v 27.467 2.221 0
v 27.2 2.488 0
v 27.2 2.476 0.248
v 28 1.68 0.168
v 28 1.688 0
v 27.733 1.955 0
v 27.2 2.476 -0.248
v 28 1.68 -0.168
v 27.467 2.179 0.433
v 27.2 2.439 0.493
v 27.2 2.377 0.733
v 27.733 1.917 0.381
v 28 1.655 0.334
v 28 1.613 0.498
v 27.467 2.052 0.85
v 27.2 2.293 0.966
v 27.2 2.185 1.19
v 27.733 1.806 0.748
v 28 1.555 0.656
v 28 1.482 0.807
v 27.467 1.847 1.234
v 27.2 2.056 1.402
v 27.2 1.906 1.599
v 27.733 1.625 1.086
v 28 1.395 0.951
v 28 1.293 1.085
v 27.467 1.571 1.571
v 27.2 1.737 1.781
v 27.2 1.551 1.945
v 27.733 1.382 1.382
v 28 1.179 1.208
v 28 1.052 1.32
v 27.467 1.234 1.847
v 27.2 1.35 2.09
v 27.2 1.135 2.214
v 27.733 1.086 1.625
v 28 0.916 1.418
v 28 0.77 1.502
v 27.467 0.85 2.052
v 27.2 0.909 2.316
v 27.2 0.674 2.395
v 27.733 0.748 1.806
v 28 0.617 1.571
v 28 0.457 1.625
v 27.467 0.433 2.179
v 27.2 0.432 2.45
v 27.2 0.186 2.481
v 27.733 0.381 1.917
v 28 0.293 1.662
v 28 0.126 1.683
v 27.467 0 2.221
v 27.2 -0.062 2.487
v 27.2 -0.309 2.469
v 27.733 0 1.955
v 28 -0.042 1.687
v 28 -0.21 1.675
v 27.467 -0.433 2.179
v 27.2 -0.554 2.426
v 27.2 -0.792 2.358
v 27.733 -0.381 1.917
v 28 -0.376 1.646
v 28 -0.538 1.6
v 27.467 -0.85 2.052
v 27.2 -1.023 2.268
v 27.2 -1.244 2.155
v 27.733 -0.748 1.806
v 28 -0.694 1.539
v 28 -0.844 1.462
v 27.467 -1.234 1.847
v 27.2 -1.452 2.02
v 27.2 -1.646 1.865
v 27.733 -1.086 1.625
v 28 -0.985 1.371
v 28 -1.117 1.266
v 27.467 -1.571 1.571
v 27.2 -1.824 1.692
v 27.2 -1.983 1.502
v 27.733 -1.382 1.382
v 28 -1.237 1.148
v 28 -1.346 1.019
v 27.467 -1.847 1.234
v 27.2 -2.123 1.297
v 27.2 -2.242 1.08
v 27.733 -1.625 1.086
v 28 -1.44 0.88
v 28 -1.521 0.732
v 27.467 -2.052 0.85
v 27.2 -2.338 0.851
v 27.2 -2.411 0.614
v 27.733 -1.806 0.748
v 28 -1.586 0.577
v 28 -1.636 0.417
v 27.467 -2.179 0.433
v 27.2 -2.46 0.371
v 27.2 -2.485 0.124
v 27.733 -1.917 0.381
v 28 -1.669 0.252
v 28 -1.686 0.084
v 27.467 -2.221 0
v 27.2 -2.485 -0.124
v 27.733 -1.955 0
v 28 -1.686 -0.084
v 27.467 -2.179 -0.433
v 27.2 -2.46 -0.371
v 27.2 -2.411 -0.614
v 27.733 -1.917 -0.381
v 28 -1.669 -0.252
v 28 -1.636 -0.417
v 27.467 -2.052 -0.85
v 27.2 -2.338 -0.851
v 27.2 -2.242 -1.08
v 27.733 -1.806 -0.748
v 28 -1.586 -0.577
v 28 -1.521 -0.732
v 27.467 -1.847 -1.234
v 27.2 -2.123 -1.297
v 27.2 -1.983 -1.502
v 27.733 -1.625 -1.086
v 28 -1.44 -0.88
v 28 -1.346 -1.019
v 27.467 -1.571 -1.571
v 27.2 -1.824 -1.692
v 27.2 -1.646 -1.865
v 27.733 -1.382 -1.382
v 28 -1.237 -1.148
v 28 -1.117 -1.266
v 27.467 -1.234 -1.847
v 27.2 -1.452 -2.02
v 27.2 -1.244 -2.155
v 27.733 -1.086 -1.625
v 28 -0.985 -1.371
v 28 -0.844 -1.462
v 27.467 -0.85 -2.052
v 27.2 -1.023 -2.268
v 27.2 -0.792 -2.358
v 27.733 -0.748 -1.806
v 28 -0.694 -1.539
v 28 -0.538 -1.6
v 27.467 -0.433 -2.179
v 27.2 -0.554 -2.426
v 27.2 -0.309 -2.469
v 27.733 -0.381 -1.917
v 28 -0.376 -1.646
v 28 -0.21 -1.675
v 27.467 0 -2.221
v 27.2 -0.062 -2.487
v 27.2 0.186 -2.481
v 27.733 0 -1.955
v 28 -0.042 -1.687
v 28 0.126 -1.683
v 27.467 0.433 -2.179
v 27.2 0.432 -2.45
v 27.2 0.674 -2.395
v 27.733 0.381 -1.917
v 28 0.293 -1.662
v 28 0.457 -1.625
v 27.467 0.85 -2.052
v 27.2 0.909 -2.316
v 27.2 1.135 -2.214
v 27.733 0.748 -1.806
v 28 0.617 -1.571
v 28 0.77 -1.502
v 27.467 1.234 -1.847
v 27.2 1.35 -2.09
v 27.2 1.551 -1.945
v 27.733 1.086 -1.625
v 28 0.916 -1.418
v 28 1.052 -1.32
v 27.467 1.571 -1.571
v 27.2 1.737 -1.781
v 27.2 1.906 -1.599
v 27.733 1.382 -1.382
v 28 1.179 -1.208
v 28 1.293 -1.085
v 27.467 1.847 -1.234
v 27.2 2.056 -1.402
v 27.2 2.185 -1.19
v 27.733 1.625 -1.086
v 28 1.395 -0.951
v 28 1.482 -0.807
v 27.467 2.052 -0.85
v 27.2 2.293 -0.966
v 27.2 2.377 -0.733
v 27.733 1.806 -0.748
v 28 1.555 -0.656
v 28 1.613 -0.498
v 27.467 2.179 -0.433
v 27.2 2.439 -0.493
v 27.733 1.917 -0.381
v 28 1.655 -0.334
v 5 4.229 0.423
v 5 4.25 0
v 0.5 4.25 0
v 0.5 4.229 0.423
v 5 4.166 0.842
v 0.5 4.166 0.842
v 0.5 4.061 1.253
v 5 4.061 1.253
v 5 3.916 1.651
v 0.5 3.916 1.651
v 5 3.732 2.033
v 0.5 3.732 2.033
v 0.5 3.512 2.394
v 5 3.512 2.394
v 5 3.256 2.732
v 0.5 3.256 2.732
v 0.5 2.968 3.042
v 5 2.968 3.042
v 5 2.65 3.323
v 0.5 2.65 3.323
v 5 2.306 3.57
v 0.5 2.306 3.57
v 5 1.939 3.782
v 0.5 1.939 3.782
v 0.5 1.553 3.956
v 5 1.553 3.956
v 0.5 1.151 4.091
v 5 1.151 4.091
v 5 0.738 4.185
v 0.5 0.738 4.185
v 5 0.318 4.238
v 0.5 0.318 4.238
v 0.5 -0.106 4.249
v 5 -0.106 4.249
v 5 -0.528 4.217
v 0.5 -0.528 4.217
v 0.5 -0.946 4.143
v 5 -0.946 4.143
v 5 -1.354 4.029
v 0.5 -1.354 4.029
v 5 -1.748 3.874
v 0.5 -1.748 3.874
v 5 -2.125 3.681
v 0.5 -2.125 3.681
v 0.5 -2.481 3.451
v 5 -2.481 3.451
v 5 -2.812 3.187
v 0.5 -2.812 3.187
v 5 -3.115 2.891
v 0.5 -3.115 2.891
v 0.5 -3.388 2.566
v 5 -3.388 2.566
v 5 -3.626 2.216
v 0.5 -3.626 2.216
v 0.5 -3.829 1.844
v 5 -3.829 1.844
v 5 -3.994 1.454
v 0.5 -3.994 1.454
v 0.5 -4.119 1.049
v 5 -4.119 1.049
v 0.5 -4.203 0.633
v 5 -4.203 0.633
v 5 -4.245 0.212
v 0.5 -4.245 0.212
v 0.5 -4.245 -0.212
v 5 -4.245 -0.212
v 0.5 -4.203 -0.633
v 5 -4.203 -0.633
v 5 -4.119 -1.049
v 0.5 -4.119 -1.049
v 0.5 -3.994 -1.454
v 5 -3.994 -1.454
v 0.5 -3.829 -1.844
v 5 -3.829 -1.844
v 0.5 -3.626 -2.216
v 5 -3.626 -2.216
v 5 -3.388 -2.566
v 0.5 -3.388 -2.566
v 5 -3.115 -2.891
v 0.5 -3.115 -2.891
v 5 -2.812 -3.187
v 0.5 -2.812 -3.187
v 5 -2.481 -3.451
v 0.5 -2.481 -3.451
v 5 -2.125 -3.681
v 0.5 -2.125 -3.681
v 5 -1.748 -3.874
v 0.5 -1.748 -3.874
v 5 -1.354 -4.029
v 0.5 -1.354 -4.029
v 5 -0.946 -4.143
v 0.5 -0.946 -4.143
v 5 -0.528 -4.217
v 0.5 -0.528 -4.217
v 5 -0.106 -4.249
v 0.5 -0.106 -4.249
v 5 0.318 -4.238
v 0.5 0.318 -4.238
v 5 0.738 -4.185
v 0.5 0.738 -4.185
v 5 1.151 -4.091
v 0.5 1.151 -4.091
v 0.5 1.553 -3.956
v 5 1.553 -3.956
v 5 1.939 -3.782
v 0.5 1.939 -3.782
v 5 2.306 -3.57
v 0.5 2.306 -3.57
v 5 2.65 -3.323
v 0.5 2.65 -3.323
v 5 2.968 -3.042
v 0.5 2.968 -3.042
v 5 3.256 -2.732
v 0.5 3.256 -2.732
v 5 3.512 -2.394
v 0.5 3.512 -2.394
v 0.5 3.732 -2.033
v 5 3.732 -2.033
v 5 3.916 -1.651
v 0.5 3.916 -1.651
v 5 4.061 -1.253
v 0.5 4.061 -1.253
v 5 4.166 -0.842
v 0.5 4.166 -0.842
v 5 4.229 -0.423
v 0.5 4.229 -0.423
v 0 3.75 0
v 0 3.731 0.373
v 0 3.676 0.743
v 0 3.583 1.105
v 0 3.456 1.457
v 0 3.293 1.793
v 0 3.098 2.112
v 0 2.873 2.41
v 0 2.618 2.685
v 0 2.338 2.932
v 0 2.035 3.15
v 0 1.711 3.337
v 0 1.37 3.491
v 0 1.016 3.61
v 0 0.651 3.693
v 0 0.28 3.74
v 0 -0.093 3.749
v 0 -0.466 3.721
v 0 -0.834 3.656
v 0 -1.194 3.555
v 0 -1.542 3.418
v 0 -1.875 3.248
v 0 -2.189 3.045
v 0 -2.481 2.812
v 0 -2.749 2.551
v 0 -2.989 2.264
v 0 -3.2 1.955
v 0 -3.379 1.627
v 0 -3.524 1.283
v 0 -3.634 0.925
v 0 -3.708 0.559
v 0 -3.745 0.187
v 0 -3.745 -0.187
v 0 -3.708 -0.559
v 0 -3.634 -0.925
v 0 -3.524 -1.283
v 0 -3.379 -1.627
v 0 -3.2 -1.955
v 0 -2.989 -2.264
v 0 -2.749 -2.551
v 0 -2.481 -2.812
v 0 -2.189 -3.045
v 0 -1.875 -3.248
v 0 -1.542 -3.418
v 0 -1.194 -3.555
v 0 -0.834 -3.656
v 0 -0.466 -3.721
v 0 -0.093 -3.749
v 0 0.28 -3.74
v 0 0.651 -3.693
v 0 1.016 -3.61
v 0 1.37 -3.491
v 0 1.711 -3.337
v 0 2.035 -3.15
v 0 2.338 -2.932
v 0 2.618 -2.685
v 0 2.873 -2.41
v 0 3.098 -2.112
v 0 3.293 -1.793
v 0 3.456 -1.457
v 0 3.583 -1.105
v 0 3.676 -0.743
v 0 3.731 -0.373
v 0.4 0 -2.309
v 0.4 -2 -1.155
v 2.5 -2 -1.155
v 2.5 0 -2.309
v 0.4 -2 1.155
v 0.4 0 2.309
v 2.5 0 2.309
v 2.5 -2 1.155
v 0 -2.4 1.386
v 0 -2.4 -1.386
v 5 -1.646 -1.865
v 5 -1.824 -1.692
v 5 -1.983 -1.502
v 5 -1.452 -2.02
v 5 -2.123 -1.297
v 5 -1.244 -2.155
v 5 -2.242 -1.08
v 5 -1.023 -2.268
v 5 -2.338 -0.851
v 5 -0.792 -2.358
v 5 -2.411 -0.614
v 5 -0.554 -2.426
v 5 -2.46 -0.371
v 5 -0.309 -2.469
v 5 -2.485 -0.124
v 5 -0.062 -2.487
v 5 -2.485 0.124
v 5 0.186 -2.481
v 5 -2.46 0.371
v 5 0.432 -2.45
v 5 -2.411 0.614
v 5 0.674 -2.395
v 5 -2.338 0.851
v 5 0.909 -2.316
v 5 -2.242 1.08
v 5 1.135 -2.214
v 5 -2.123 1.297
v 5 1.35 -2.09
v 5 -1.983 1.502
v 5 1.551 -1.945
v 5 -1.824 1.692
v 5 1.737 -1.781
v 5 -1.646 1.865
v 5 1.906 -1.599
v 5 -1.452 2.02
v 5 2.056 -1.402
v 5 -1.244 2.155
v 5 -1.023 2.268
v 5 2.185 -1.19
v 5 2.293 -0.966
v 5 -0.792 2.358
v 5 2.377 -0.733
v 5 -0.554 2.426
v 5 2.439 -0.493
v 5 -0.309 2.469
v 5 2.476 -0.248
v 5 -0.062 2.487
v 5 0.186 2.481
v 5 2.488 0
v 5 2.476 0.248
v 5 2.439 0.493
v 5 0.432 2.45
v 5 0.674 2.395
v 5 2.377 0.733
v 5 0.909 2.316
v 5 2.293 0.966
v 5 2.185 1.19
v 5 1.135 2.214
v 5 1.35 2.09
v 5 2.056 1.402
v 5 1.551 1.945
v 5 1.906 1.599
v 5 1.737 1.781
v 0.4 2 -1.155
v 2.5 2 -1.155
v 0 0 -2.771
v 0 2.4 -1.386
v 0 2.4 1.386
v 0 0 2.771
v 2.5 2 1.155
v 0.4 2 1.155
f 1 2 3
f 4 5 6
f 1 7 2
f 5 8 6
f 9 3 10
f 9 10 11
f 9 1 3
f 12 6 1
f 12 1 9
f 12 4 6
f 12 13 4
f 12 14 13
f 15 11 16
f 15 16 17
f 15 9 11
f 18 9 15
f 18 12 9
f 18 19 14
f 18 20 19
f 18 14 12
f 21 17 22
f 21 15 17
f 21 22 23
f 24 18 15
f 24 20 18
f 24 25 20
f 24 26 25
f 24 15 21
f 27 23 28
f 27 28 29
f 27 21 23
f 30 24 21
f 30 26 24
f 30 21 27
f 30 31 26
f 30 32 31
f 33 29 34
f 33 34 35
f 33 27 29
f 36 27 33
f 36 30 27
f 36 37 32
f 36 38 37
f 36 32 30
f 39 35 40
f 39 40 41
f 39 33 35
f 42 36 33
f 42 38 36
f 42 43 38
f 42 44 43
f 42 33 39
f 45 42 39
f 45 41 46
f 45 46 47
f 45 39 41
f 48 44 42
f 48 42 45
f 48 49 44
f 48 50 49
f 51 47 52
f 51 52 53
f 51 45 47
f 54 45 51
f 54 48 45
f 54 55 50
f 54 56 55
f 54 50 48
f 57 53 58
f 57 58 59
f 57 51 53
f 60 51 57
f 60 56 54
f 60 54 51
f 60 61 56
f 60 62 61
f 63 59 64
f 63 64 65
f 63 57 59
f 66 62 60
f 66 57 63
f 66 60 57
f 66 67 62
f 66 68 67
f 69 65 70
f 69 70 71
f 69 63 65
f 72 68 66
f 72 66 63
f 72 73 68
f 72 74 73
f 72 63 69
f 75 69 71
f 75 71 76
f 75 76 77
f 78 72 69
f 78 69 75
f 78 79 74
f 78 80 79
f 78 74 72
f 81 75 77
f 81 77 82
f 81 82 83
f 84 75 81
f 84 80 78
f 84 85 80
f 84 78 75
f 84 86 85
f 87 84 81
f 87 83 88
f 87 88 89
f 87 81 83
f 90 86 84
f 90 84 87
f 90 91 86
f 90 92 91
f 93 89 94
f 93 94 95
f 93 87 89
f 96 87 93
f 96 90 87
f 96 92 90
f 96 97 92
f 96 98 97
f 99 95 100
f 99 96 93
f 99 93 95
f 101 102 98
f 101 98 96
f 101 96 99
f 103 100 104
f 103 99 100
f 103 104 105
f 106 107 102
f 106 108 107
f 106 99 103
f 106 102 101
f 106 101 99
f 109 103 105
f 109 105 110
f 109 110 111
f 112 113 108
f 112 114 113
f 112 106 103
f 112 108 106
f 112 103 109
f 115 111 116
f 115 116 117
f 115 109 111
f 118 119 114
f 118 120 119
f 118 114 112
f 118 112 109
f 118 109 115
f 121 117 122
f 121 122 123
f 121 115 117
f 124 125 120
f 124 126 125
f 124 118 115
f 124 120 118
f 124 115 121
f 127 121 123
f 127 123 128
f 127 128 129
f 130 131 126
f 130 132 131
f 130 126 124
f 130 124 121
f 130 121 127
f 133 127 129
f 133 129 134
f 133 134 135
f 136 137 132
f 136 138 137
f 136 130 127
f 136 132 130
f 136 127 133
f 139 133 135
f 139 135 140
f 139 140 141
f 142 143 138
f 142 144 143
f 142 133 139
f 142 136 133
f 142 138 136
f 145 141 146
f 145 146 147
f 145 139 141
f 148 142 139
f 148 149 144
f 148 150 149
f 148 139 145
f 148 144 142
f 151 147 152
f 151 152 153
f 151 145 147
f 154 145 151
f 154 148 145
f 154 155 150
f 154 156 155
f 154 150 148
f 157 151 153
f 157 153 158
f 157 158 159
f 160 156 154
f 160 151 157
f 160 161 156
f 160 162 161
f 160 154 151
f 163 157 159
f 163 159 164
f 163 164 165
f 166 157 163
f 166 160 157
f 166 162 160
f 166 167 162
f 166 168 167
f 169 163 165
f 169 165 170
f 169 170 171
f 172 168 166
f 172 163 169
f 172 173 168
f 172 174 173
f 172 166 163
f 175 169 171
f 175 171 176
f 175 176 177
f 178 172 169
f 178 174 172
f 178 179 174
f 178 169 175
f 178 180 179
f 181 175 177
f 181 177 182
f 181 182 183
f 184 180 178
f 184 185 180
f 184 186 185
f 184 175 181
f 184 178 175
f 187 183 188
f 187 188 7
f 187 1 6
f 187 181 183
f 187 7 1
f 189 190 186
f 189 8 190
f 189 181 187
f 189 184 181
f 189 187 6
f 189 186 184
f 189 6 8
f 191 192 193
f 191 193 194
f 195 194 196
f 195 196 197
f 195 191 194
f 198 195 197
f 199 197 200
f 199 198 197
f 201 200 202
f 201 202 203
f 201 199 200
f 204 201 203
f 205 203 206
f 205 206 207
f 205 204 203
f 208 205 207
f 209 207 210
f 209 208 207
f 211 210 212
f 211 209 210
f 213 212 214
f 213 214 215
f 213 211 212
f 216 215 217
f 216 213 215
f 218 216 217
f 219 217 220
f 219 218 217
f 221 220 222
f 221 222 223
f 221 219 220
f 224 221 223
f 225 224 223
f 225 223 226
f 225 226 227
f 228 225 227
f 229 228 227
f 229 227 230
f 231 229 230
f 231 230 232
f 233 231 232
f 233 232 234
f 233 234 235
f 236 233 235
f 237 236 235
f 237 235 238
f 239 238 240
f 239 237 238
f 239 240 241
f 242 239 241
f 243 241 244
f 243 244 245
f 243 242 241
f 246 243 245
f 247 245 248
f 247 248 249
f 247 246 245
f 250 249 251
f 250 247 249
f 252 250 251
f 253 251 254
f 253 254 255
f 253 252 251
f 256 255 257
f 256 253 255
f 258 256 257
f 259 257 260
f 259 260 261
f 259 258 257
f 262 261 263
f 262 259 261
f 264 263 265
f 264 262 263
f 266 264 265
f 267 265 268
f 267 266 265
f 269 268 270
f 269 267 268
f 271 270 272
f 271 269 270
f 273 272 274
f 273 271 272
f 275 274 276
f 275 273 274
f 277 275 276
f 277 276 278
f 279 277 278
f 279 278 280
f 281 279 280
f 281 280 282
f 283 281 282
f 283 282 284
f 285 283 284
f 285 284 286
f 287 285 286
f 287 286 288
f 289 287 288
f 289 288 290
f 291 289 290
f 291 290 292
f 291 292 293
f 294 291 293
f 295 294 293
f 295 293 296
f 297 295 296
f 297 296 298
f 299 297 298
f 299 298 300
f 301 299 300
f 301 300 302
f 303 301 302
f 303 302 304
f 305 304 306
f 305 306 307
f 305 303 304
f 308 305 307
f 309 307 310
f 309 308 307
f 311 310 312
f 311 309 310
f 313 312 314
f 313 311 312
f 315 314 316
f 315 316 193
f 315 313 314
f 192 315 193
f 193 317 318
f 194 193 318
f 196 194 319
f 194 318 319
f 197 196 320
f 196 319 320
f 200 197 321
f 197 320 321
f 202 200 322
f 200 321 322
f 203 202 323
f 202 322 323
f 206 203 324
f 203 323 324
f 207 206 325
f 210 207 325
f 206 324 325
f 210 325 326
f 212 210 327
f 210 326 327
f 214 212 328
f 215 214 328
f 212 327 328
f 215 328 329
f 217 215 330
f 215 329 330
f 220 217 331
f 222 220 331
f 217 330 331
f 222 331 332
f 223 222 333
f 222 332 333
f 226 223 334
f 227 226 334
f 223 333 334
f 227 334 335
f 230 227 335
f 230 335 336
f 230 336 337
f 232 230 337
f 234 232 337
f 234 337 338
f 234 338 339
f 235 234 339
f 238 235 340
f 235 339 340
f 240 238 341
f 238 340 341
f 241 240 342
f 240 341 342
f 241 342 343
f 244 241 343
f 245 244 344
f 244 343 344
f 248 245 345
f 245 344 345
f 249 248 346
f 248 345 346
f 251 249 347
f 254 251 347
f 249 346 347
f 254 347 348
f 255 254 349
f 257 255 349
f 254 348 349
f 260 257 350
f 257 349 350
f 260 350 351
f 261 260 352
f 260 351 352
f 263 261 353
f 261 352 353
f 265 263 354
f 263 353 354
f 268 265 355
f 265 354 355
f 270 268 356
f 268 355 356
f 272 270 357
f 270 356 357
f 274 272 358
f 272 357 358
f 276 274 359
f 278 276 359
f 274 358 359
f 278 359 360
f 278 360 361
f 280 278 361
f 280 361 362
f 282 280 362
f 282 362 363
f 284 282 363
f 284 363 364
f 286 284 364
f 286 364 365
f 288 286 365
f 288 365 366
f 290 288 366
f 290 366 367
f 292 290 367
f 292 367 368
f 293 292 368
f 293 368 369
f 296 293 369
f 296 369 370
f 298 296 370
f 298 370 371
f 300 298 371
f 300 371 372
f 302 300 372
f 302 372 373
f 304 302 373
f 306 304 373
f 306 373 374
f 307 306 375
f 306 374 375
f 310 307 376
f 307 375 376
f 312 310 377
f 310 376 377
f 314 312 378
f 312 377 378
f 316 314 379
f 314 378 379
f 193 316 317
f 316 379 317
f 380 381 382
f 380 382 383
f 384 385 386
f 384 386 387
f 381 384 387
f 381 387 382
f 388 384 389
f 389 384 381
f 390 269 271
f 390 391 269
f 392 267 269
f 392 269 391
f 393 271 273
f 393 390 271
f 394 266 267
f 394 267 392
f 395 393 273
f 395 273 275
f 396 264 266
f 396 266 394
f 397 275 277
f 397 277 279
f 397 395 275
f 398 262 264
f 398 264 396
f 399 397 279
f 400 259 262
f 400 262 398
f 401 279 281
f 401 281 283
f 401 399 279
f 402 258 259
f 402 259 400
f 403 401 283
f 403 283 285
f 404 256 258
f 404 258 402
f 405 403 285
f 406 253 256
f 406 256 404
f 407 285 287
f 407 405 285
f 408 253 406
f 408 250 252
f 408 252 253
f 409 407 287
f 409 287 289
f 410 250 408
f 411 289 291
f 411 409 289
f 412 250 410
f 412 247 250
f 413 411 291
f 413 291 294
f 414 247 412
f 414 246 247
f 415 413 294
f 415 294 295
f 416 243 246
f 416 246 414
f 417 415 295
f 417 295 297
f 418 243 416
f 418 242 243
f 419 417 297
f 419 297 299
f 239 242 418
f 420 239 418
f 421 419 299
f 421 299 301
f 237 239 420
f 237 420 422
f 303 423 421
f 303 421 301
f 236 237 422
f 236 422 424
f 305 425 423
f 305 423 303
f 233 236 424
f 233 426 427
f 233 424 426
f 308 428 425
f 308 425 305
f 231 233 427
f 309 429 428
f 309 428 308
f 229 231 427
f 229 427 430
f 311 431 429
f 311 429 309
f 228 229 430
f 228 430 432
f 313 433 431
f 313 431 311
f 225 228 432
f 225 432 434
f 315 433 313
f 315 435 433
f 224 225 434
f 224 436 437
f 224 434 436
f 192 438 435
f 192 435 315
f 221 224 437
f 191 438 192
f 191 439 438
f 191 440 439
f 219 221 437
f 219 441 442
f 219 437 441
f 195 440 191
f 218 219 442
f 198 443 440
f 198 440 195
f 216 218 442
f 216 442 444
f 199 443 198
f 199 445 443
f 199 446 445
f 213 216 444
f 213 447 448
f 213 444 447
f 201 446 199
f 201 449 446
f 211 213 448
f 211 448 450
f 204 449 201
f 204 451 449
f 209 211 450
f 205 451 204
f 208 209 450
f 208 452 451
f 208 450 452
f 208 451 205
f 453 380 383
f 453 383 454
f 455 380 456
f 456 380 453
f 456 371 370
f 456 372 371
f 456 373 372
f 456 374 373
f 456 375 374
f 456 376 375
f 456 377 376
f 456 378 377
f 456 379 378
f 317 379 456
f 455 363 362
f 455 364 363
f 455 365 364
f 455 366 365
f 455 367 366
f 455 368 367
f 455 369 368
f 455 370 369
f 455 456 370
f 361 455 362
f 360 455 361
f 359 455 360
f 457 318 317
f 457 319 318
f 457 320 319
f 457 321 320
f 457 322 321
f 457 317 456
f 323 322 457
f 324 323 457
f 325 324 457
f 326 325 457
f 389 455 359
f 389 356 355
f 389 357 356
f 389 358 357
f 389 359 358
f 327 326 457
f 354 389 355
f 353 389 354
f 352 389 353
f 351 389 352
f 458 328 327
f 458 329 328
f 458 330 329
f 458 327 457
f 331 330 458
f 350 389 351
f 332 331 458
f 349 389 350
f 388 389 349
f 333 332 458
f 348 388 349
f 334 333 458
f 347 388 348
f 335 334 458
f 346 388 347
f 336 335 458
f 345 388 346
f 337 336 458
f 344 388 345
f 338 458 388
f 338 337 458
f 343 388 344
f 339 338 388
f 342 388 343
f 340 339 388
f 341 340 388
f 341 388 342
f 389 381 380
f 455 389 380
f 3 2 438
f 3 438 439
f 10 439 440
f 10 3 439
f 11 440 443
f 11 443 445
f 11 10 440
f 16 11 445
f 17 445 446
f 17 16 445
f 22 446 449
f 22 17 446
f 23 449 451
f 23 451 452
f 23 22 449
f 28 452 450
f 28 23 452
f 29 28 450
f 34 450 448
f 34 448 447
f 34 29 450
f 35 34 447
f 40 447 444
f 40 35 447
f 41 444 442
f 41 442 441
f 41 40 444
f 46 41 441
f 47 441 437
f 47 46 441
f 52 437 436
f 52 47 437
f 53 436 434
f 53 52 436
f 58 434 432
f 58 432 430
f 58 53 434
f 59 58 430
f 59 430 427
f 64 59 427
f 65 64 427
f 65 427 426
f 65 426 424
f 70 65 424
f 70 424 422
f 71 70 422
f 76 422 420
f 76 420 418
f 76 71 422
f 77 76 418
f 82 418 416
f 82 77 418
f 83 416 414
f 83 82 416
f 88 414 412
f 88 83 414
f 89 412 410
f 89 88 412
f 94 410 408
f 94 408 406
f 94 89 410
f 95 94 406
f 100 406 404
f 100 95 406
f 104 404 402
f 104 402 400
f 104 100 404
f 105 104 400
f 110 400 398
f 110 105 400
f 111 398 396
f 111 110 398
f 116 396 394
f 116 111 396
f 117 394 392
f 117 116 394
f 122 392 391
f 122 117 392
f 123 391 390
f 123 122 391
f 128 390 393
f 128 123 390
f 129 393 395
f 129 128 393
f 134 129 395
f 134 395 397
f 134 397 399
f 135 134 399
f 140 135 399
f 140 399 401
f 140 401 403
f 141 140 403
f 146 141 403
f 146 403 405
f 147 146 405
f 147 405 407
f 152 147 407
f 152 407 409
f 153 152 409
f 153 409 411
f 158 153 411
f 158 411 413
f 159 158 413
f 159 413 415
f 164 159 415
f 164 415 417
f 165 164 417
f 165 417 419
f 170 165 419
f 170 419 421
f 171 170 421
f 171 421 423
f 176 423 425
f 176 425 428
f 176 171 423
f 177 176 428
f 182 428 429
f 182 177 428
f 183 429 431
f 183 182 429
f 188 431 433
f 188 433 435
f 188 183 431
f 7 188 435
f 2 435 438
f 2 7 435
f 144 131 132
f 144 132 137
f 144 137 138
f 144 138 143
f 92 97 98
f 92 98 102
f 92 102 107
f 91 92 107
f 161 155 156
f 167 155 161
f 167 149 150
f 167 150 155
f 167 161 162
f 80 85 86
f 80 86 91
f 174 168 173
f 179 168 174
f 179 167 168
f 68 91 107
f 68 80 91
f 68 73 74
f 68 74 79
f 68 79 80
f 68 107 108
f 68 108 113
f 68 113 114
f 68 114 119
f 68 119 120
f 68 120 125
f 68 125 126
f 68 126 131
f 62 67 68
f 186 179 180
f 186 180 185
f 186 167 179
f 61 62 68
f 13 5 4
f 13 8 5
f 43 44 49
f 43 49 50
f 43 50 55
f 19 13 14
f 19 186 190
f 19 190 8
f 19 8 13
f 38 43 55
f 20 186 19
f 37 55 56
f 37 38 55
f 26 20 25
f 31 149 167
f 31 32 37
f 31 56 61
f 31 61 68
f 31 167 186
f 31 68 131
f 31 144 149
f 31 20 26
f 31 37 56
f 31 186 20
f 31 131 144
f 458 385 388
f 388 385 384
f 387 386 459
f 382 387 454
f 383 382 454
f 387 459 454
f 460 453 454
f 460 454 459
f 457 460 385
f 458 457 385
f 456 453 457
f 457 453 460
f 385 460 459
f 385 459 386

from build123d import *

# Parameters (mm, degrees)
CHAMFER1_SIZE      = 0.8
CHAMFER2_SIZE      = 0.5
CUT_EXTRUDE1_DEPTH = 2.5
CHAMFER3_SIZE      = 0.4


with BuildPart() as part:
    # Sketch1 → Revolve1 (revolve)
    with BuildSketch(Plane.XY):
        Polygon((0, 0), (0, 4.25), (5, 4.25), (5, 2.488), (28, 2.488), (28, 0), align=None)
    revolve(axis=Axis((-88.705490849, 0, 0), (1, 0, 0)))

    # Chamfer1
    chamfer1_edges = [part.edges().sort_by_distance(p)[0] for p in [
        (28, -2.488, 0),
    ]]
    chamfer(chamfer1_edges, length=CHAMFER1_SIZE)

    # Chamfer2
    chamfer2_edges = [part.edges().sort_by_distance(p)[0] for p in [
        (0, -4.25, 0),
    ]]
    chamfer(chamfer2_edges, length=CHAMFER2_SIZE)

    # Sketch3 → Cut-Extrude1 (cut)
    with BuildSketch(Plane(origin=(0, 0, 0), x_dir=(0, 0, -1), z_dir=(1, 0, 0))):
        Polygon((-2.309401077, 0), (-1.154700538, -2), (1.154700538, -2), (2.309401077, 0), (1.154700538, 2), (-1.154700538, 2), align=None)
    extrude(amount=CUT_EXTRUDE1_DEPTH, mode=Mode.SUBTRACT)

    # Chamfer3
    chamfer3_edges = [part.edges().sort_by_distance(p)[0] for p in [
        (0, 1, 1.732050808),
        (0, -1, 1.732050808),
        (0, -2, 0),
        (0, -1, -1.732050808),
        (0, 1, -1.732050808),
        (0, 2, 0),
    ]]
    chamfer(chamfer3_edges, length=CHAMFER3_SIZE)


solid = part.part
